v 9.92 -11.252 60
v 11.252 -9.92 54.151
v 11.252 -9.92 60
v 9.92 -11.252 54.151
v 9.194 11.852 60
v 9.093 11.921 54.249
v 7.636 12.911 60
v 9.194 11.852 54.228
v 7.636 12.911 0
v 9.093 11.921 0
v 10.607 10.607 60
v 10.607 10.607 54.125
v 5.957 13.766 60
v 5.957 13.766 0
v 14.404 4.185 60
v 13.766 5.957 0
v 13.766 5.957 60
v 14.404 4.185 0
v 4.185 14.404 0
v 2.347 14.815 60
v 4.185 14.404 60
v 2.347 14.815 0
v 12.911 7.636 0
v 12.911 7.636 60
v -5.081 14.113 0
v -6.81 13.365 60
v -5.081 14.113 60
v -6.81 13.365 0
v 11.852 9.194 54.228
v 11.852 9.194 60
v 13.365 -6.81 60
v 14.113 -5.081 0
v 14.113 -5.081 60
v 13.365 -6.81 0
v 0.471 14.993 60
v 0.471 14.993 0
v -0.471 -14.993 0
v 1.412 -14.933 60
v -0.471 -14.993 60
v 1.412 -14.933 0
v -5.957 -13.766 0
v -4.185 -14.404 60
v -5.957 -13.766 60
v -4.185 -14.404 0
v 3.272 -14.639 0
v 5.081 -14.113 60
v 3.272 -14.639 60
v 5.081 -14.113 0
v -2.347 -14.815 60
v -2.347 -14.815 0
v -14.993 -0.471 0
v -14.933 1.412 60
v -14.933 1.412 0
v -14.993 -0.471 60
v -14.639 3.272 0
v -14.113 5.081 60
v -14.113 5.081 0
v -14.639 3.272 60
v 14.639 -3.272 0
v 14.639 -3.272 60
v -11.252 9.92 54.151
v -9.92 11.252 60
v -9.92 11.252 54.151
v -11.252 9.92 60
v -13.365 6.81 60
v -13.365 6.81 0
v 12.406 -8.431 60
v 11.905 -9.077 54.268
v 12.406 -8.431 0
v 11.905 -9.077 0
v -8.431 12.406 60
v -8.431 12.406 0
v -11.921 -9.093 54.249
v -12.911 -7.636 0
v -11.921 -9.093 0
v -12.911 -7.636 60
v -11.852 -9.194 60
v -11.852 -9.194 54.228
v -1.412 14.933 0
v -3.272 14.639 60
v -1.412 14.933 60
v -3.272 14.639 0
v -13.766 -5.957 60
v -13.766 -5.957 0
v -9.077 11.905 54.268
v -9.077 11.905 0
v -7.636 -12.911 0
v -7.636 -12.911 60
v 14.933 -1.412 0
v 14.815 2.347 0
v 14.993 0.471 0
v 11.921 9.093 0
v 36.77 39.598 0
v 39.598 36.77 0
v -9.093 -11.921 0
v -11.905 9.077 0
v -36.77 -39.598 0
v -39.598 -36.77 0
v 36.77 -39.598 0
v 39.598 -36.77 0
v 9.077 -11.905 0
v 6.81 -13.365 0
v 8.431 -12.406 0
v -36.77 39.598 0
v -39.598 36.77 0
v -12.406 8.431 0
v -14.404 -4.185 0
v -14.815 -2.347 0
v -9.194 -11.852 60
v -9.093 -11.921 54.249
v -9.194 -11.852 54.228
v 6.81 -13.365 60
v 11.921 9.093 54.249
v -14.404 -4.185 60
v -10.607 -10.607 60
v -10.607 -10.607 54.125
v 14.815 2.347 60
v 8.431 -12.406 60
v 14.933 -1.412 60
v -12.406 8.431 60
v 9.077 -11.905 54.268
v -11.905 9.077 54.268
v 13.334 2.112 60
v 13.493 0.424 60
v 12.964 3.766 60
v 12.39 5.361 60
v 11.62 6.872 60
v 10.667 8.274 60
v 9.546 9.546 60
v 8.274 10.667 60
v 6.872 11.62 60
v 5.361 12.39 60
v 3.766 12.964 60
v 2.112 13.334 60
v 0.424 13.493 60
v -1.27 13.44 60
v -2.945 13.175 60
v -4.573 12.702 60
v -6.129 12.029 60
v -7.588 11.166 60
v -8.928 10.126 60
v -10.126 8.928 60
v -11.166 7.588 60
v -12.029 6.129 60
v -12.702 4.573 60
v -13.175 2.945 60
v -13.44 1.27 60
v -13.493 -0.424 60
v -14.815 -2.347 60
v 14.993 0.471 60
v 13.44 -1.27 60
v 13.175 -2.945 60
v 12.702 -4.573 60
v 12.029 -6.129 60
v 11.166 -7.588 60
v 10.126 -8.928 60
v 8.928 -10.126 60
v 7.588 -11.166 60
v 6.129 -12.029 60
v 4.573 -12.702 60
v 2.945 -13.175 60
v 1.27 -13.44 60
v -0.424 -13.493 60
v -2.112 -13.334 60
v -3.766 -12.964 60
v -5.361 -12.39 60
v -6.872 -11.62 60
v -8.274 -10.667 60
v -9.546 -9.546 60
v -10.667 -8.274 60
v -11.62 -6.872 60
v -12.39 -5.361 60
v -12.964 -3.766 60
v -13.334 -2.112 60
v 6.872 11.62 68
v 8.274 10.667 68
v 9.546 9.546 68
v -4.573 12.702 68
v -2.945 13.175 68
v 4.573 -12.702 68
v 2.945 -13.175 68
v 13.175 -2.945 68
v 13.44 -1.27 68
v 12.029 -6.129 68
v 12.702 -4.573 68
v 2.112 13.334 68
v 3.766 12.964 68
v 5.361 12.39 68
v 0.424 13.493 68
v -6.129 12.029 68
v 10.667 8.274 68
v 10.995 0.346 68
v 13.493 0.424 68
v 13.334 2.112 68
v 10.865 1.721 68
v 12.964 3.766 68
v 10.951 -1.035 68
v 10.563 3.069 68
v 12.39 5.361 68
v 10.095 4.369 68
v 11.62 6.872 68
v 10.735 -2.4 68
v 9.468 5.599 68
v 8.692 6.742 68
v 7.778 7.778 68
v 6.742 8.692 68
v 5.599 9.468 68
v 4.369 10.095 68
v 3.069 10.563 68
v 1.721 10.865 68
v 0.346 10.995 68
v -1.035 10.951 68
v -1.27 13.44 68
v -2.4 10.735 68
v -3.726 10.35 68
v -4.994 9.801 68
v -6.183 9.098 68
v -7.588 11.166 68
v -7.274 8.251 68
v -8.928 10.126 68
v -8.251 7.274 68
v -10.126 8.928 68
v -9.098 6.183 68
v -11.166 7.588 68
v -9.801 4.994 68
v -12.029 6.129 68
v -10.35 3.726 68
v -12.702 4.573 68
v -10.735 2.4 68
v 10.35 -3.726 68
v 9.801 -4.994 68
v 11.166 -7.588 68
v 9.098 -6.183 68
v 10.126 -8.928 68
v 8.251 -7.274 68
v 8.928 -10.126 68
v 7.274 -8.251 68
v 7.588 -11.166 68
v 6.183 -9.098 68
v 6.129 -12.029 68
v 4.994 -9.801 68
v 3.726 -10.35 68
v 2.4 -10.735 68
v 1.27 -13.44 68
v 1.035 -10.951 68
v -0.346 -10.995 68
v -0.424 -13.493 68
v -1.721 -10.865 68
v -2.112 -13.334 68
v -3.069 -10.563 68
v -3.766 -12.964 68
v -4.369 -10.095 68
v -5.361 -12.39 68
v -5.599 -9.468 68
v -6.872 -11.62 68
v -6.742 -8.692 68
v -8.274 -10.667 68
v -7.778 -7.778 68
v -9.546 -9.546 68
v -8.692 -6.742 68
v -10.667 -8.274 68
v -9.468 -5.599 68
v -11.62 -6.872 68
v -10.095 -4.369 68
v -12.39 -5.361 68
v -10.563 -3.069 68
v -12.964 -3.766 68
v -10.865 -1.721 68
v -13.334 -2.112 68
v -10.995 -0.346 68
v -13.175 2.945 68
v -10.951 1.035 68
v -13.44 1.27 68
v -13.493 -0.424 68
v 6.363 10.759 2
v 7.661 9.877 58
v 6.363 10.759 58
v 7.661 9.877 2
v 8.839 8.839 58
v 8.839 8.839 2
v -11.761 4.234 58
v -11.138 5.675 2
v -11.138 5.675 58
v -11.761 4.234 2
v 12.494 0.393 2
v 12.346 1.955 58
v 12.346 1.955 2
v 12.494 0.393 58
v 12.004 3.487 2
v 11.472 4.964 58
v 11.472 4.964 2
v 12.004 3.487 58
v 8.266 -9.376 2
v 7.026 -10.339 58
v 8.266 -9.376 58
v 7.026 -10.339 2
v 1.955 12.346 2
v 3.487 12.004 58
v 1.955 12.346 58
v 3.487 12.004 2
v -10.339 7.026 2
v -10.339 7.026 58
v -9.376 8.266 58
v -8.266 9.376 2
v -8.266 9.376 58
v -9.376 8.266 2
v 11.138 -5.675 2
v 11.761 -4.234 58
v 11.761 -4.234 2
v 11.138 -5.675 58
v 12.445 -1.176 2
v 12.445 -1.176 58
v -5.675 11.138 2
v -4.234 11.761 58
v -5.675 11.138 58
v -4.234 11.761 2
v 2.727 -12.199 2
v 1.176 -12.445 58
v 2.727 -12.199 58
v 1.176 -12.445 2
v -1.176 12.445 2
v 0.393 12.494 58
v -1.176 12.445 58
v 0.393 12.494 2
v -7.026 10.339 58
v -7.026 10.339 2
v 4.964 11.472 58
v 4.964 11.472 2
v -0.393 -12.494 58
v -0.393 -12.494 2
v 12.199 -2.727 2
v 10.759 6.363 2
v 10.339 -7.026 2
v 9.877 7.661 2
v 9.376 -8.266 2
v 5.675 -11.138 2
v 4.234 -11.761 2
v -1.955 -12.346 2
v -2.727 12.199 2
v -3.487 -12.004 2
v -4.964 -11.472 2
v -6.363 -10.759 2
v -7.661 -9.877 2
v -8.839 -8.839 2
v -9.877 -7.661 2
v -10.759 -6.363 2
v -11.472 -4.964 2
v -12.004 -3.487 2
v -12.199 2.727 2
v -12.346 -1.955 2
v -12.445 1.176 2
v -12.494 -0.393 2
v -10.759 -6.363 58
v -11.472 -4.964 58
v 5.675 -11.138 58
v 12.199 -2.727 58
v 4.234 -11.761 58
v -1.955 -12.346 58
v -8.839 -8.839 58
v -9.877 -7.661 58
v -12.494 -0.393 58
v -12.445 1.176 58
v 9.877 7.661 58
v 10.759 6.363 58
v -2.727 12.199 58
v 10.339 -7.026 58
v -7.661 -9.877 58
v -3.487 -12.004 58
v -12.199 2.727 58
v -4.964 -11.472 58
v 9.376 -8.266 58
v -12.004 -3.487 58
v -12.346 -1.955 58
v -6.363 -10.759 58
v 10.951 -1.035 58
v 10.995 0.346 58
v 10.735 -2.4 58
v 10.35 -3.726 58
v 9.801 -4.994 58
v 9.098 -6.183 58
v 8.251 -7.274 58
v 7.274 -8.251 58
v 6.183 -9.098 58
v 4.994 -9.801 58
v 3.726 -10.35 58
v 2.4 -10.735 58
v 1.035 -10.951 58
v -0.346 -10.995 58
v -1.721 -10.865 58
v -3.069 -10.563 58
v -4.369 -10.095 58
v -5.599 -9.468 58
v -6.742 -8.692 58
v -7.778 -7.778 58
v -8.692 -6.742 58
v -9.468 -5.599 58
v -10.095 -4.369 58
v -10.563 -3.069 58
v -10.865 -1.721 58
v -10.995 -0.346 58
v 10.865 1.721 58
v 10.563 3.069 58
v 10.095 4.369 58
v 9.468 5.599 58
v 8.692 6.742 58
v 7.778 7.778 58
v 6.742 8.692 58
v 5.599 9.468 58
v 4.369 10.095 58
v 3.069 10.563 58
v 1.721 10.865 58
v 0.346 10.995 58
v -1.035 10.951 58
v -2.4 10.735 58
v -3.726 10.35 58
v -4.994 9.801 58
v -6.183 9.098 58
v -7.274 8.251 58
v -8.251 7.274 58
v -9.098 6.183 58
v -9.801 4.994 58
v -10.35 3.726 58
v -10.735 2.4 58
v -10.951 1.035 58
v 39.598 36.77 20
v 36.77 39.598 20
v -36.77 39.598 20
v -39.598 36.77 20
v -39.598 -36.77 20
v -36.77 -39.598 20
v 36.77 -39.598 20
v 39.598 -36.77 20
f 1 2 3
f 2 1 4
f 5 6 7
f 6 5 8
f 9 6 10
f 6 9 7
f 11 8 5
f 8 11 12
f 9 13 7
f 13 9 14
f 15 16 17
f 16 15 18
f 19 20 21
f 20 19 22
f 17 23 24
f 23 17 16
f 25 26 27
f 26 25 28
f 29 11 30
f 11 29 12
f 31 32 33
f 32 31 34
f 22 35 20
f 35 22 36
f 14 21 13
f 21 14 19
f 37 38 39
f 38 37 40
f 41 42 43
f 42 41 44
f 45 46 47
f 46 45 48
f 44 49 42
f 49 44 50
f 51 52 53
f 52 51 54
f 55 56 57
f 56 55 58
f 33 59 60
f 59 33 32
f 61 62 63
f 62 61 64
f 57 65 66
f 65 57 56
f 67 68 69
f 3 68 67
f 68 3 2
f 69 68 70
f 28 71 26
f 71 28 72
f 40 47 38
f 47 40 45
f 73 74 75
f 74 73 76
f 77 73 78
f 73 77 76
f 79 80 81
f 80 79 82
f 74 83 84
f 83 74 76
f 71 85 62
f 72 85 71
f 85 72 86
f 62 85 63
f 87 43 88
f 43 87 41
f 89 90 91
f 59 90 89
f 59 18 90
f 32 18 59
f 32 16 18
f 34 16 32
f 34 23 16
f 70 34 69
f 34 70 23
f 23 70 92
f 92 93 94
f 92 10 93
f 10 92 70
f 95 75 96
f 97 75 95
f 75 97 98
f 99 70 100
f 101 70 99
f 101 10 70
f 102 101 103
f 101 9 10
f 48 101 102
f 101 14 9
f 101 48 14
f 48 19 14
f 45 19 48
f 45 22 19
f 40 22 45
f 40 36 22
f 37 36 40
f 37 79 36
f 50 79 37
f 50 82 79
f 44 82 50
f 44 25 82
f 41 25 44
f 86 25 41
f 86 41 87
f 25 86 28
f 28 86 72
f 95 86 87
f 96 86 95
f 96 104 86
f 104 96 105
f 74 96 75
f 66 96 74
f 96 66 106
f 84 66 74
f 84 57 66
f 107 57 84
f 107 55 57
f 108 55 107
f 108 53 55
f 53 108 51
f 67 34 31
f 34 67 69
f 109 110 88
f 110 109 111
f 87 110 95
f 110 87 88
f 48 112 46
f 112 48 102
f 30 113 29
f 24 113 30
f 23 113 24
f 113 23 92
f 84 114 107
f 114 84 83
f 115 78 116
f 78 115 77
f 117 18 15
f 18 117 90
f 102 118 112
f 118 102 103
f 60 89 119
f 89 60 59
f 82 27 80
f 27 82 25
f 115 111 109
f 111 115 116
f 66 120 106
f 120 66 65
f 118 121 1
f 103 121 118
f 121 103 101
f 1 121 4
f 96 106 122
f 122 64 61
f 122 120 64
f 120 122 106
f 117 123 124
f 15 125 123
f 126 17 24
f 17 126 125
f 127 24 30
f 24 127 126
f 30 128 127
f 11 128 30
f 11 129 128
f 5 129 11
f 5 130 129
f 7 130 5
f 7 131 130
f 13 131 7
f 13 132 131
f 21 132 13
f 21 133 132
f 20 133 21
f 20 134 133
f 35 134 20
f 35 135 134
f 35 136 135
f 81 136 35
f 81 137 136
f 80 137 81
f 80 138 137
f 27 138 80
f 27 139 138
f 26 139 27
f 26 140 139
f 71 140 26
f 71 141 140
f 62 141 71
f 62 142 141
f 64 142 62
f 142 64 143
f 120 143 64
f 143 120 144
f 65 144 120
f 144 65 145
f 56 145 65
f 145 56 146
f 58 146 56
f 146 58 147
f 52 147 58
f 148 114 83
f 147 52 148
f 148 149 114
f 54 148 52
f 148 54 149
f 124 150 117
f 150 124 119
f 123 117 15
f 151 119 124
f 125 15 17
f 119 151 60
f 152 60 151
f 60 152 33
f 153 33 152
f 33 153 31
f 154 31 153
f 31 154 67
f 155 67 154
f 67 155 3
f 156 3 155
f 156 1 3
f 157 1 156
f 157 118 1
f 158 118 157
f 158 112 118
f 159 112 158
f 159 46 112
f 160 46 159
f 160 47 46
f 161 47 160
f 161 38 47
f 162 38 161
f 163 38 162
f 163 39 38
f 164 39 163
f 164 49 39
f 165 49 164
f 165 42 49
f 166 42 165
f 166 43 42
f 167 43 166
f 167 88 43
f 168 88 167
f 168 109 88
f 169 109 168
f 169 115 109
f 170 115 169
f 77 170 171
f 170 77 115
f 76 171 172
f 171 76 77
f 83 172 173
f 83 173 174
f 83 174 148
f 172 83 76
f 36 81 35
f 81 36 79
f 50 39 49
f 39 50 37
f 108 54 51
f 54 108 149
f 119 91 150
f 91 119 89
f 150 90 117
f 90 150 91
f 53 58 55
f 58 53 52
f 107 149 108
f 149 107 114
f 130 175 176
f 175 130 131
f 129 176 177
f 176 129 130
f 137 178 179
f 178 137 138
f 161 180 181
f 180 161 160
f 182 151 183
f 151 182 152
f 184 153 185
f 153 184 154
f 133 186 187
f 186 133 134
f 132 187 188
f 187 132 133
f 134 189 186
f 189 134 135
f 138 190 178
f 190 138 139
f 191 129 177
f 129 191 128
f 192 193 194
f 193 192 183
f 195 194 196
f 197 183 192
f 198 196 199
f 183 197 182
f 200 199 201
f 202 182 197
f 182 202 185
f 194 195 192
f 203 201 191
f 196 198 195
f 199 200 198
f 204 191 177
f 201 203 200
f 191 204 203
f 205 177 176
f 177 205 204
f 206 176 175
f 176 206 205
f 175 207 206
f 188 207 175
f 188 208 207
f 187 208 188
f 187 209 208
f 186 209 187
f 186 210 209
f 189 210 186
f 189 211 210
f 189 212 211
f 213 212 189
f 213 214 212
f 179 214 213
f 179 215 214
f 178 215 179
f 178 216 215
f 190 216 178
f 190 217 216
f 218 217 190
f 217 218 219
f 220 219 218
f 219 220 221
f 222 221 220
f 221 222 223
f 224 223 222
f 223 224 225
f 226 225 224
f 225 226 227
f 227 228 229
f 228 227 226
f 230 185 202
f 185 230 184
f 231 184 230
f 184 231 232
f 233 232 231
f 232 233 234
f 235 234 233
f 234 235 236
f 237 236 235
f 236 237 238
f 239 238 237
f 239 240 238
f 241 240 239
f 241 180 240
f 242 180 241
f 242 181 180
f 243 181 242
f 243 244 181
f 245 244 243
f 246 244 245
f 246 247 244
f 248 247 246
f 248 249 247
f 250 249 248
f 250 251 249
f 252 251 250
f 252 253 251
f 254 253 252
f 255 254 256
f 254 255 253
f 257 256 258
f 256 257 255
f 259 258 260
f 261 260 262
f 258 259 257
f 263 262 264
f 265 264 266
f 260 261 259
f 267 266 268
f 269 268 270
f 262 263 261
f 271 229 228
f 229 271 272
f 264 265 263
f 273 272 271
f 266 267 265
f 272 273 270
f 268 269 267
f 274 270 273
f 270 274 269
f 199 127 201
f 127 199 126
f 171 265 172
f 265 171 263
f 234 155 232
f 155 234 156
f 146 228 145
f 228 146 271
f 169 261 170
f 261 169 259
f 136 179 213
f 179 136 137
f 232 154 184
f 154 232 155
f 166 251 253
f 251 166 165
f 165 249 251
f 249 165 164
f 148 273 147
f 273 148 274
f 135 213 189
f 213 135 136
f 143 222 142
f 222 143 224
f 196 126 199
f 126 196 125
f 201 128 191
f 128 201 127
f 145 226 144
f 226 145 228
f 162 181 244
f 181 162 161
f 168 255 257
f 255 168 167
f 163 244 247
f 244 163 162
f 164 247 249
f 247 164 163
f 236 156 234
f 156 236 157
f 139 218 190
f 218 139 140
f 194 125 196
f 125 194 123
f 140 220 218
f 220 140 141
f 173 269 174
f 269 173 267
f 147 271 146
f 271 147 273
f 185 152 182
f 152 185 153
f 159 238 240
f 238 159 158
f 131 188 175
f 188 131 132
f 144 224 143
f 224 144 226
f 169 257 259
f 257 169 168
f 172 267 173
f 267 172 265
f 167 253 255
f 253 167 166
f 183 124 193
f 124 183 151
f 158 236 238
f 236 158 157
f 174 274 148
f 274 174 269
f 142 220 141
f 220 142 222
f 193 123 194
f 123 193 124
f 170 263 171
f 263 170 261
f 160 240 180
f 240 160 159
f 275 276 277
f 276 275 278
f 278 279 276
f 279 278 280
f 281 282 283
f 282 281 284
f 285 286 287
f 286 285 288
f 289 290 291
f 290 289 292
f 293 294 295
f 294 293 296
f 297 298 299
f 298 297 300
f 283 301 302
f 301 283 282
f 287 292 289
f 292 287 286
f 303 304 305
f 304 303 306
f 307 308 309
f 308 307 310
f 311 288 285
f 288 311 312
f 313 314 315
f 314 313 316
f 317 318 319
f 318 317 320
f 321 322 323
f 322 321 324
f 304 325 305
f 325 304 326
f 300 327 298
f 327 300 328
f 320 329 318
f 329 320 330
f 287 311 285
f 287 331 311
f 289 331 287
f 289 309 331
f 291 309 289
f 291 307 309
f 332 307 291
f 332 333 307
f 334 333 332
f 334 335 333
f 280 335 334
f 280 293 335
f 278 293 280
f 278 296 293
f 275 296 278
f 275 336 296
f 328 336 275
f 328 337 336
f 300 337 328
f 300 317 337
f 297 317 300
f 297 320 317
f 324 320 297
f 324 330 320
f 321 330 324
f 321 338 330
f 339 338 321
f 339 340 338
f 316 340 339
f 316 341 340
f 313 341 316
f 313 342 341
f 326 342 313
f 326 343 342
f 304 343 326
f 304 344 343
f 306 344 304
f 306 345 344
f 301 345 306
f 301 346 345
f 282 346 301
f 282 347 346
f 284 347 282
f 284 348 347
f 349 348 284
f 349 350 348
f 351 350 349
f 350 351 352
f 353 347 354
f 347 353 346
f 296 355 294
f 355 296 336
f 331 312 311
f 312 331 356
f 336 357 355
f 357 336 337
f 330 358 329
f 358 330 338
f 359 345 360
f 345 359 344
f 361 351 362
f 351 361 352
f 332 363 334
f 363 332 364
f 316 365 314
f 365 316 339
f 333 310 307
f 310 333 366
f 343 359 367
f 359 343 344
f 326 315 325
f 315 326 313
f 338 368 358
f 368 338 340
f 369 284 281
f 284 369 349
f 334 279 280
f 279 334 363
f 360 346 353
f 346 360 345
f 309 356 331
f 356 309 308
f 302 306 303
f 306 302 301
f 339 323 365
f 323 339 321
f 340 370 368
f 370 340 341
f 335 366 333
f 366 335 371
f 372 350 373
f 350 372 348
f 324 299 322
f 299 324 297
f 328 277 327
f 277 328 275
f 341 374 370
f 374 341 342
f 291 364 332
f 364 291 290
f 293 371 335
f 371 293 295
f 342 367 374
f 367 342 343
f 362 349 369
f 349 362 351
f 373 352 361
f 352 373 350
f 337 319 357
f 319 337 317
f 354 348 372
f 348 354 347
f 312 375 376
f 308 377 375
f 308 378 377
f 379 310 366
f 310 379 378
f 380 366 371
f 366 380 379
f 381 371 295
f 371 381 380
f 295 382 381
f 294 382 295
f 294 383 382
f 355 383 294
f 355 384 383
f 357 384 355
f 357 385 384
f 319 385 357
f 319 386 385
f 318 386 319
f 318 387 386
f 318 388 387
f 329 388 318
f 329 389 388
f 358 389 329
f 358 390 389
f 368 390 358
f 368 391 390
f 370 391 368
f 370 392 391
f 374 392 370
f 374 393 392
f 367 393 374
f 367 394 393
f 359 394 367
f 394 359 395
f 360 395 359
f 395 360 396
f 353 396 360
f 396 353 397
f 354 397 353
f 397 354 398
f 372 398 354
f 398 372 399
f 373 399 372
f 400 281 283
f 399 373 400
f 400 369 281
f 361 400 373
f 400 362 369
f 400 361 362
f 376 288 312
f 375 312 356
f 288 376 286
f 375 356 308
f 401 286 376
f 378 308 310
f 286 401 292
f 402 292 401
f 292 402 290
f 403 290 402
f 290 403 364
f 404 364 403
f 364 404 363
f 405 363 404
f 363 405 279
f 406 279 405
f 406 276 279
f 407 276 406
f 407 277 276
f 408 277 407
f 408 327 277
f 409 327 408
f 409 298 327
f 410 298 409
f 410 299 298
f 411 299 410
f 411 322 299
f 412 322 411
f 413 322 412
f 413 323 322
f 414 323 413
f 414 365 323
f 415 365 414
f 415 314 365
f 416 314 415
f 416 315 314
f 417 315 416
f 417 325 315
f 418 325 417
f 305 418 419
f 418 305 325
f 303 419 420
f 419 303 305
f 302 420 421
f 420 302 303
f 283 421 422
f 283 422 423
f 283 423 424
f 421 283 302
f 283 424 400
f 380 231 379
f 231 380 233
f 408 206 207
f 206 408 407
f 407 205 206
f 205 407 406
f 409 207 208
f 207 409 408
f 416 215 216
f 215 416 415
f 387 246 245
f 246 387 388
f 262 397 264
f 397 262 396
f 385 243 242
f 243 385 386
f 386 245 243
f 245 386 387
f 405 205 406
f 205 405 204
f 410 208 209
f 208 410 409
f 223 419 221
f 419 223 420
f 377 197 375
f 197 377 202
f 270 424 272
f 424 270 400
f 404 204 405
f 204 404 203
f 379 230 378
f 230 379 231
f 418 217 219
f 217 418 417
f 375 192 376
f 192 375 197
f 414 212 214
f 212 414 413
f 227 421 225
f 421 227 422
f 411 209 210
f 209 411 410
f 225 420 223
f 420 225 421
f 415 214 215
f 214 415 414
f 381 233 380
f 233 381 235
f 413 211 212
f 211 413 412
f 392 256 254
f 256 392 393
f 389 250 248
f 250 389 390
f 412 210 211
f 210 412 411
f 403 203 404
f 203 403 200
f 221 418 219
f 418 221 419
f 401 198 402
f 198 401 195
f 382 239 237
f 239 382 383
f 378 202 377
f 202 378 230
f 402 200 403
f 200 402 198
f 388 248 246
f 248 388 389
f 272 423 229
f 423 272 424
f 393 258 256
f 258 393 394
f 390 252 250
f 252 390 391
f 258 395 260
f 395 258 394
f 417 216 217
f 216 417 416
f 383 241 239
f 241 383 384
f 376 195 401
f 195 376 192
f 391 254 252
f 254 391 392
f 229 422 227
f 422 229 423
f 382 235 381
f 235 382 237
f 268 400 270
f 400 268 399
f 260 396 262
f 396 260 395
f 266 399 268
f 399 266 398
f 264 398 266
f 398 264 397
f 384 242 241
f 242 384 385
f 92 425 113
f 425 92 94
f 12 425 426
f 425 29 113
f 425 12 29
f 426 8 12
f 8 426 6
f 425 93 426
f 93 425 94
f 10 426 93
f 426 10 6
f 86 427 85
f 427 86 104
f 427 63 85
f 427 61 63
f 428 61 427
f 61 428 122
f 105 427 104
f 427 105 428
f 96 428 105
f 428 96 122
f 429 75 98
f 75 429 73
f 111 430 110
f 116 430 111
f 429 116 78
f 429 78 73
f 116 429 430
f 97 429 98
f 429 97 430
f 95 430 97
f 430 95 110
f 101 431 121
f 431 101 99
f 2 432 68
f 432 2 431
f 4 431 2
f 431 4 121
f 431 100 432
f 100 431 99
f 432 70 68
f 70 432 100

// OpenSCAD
diameter = 30;
wallThickness = 2.5;
height = 60;
interlockHeight = 8;
interlockOD = diameter-3;
finMinHeight = 20;
finMaxHeight = 55;
finLength = 40;
finThickness = 4;
bottomThickness = 3;


module mainShape(){
	cylinder (height, diameter/2, diameter/2, $fn=50);
	translate ([0,0,height]) cylinder (interlockHeight, interlockOD/2, interlockOD/2, $fn=50);
}

module cutout(){
	translate ([0,0,-1+bottomThickness]) cylinder (height-1-bottomThickness, diameter/2-wallThickness, diameter/2-wallThickness, $fn=50);
	translate ([0,0,height-3]) cylinder (interlockHeight+14, interlockOD/2-wallThickness, interlockOD/2-wallThickness, $fn=50);
}

module fins(){
	for(i=[0:3]){
		rotate ([0,0,i*90]) translate ([diameter/2-1, finThickness/2]) rotate ([90,0]) linear_extrude(height = finThickness) polygon (points=[[0,0], [finLength,0], [finLength, finMinHeight], [0,finMaxHeight]], paths=[[0,1,2,3]]);
	}
}

rotate ([0,0,45]){
	difference (){
		mainShape();
		cutout();
	}
	fins();
}
